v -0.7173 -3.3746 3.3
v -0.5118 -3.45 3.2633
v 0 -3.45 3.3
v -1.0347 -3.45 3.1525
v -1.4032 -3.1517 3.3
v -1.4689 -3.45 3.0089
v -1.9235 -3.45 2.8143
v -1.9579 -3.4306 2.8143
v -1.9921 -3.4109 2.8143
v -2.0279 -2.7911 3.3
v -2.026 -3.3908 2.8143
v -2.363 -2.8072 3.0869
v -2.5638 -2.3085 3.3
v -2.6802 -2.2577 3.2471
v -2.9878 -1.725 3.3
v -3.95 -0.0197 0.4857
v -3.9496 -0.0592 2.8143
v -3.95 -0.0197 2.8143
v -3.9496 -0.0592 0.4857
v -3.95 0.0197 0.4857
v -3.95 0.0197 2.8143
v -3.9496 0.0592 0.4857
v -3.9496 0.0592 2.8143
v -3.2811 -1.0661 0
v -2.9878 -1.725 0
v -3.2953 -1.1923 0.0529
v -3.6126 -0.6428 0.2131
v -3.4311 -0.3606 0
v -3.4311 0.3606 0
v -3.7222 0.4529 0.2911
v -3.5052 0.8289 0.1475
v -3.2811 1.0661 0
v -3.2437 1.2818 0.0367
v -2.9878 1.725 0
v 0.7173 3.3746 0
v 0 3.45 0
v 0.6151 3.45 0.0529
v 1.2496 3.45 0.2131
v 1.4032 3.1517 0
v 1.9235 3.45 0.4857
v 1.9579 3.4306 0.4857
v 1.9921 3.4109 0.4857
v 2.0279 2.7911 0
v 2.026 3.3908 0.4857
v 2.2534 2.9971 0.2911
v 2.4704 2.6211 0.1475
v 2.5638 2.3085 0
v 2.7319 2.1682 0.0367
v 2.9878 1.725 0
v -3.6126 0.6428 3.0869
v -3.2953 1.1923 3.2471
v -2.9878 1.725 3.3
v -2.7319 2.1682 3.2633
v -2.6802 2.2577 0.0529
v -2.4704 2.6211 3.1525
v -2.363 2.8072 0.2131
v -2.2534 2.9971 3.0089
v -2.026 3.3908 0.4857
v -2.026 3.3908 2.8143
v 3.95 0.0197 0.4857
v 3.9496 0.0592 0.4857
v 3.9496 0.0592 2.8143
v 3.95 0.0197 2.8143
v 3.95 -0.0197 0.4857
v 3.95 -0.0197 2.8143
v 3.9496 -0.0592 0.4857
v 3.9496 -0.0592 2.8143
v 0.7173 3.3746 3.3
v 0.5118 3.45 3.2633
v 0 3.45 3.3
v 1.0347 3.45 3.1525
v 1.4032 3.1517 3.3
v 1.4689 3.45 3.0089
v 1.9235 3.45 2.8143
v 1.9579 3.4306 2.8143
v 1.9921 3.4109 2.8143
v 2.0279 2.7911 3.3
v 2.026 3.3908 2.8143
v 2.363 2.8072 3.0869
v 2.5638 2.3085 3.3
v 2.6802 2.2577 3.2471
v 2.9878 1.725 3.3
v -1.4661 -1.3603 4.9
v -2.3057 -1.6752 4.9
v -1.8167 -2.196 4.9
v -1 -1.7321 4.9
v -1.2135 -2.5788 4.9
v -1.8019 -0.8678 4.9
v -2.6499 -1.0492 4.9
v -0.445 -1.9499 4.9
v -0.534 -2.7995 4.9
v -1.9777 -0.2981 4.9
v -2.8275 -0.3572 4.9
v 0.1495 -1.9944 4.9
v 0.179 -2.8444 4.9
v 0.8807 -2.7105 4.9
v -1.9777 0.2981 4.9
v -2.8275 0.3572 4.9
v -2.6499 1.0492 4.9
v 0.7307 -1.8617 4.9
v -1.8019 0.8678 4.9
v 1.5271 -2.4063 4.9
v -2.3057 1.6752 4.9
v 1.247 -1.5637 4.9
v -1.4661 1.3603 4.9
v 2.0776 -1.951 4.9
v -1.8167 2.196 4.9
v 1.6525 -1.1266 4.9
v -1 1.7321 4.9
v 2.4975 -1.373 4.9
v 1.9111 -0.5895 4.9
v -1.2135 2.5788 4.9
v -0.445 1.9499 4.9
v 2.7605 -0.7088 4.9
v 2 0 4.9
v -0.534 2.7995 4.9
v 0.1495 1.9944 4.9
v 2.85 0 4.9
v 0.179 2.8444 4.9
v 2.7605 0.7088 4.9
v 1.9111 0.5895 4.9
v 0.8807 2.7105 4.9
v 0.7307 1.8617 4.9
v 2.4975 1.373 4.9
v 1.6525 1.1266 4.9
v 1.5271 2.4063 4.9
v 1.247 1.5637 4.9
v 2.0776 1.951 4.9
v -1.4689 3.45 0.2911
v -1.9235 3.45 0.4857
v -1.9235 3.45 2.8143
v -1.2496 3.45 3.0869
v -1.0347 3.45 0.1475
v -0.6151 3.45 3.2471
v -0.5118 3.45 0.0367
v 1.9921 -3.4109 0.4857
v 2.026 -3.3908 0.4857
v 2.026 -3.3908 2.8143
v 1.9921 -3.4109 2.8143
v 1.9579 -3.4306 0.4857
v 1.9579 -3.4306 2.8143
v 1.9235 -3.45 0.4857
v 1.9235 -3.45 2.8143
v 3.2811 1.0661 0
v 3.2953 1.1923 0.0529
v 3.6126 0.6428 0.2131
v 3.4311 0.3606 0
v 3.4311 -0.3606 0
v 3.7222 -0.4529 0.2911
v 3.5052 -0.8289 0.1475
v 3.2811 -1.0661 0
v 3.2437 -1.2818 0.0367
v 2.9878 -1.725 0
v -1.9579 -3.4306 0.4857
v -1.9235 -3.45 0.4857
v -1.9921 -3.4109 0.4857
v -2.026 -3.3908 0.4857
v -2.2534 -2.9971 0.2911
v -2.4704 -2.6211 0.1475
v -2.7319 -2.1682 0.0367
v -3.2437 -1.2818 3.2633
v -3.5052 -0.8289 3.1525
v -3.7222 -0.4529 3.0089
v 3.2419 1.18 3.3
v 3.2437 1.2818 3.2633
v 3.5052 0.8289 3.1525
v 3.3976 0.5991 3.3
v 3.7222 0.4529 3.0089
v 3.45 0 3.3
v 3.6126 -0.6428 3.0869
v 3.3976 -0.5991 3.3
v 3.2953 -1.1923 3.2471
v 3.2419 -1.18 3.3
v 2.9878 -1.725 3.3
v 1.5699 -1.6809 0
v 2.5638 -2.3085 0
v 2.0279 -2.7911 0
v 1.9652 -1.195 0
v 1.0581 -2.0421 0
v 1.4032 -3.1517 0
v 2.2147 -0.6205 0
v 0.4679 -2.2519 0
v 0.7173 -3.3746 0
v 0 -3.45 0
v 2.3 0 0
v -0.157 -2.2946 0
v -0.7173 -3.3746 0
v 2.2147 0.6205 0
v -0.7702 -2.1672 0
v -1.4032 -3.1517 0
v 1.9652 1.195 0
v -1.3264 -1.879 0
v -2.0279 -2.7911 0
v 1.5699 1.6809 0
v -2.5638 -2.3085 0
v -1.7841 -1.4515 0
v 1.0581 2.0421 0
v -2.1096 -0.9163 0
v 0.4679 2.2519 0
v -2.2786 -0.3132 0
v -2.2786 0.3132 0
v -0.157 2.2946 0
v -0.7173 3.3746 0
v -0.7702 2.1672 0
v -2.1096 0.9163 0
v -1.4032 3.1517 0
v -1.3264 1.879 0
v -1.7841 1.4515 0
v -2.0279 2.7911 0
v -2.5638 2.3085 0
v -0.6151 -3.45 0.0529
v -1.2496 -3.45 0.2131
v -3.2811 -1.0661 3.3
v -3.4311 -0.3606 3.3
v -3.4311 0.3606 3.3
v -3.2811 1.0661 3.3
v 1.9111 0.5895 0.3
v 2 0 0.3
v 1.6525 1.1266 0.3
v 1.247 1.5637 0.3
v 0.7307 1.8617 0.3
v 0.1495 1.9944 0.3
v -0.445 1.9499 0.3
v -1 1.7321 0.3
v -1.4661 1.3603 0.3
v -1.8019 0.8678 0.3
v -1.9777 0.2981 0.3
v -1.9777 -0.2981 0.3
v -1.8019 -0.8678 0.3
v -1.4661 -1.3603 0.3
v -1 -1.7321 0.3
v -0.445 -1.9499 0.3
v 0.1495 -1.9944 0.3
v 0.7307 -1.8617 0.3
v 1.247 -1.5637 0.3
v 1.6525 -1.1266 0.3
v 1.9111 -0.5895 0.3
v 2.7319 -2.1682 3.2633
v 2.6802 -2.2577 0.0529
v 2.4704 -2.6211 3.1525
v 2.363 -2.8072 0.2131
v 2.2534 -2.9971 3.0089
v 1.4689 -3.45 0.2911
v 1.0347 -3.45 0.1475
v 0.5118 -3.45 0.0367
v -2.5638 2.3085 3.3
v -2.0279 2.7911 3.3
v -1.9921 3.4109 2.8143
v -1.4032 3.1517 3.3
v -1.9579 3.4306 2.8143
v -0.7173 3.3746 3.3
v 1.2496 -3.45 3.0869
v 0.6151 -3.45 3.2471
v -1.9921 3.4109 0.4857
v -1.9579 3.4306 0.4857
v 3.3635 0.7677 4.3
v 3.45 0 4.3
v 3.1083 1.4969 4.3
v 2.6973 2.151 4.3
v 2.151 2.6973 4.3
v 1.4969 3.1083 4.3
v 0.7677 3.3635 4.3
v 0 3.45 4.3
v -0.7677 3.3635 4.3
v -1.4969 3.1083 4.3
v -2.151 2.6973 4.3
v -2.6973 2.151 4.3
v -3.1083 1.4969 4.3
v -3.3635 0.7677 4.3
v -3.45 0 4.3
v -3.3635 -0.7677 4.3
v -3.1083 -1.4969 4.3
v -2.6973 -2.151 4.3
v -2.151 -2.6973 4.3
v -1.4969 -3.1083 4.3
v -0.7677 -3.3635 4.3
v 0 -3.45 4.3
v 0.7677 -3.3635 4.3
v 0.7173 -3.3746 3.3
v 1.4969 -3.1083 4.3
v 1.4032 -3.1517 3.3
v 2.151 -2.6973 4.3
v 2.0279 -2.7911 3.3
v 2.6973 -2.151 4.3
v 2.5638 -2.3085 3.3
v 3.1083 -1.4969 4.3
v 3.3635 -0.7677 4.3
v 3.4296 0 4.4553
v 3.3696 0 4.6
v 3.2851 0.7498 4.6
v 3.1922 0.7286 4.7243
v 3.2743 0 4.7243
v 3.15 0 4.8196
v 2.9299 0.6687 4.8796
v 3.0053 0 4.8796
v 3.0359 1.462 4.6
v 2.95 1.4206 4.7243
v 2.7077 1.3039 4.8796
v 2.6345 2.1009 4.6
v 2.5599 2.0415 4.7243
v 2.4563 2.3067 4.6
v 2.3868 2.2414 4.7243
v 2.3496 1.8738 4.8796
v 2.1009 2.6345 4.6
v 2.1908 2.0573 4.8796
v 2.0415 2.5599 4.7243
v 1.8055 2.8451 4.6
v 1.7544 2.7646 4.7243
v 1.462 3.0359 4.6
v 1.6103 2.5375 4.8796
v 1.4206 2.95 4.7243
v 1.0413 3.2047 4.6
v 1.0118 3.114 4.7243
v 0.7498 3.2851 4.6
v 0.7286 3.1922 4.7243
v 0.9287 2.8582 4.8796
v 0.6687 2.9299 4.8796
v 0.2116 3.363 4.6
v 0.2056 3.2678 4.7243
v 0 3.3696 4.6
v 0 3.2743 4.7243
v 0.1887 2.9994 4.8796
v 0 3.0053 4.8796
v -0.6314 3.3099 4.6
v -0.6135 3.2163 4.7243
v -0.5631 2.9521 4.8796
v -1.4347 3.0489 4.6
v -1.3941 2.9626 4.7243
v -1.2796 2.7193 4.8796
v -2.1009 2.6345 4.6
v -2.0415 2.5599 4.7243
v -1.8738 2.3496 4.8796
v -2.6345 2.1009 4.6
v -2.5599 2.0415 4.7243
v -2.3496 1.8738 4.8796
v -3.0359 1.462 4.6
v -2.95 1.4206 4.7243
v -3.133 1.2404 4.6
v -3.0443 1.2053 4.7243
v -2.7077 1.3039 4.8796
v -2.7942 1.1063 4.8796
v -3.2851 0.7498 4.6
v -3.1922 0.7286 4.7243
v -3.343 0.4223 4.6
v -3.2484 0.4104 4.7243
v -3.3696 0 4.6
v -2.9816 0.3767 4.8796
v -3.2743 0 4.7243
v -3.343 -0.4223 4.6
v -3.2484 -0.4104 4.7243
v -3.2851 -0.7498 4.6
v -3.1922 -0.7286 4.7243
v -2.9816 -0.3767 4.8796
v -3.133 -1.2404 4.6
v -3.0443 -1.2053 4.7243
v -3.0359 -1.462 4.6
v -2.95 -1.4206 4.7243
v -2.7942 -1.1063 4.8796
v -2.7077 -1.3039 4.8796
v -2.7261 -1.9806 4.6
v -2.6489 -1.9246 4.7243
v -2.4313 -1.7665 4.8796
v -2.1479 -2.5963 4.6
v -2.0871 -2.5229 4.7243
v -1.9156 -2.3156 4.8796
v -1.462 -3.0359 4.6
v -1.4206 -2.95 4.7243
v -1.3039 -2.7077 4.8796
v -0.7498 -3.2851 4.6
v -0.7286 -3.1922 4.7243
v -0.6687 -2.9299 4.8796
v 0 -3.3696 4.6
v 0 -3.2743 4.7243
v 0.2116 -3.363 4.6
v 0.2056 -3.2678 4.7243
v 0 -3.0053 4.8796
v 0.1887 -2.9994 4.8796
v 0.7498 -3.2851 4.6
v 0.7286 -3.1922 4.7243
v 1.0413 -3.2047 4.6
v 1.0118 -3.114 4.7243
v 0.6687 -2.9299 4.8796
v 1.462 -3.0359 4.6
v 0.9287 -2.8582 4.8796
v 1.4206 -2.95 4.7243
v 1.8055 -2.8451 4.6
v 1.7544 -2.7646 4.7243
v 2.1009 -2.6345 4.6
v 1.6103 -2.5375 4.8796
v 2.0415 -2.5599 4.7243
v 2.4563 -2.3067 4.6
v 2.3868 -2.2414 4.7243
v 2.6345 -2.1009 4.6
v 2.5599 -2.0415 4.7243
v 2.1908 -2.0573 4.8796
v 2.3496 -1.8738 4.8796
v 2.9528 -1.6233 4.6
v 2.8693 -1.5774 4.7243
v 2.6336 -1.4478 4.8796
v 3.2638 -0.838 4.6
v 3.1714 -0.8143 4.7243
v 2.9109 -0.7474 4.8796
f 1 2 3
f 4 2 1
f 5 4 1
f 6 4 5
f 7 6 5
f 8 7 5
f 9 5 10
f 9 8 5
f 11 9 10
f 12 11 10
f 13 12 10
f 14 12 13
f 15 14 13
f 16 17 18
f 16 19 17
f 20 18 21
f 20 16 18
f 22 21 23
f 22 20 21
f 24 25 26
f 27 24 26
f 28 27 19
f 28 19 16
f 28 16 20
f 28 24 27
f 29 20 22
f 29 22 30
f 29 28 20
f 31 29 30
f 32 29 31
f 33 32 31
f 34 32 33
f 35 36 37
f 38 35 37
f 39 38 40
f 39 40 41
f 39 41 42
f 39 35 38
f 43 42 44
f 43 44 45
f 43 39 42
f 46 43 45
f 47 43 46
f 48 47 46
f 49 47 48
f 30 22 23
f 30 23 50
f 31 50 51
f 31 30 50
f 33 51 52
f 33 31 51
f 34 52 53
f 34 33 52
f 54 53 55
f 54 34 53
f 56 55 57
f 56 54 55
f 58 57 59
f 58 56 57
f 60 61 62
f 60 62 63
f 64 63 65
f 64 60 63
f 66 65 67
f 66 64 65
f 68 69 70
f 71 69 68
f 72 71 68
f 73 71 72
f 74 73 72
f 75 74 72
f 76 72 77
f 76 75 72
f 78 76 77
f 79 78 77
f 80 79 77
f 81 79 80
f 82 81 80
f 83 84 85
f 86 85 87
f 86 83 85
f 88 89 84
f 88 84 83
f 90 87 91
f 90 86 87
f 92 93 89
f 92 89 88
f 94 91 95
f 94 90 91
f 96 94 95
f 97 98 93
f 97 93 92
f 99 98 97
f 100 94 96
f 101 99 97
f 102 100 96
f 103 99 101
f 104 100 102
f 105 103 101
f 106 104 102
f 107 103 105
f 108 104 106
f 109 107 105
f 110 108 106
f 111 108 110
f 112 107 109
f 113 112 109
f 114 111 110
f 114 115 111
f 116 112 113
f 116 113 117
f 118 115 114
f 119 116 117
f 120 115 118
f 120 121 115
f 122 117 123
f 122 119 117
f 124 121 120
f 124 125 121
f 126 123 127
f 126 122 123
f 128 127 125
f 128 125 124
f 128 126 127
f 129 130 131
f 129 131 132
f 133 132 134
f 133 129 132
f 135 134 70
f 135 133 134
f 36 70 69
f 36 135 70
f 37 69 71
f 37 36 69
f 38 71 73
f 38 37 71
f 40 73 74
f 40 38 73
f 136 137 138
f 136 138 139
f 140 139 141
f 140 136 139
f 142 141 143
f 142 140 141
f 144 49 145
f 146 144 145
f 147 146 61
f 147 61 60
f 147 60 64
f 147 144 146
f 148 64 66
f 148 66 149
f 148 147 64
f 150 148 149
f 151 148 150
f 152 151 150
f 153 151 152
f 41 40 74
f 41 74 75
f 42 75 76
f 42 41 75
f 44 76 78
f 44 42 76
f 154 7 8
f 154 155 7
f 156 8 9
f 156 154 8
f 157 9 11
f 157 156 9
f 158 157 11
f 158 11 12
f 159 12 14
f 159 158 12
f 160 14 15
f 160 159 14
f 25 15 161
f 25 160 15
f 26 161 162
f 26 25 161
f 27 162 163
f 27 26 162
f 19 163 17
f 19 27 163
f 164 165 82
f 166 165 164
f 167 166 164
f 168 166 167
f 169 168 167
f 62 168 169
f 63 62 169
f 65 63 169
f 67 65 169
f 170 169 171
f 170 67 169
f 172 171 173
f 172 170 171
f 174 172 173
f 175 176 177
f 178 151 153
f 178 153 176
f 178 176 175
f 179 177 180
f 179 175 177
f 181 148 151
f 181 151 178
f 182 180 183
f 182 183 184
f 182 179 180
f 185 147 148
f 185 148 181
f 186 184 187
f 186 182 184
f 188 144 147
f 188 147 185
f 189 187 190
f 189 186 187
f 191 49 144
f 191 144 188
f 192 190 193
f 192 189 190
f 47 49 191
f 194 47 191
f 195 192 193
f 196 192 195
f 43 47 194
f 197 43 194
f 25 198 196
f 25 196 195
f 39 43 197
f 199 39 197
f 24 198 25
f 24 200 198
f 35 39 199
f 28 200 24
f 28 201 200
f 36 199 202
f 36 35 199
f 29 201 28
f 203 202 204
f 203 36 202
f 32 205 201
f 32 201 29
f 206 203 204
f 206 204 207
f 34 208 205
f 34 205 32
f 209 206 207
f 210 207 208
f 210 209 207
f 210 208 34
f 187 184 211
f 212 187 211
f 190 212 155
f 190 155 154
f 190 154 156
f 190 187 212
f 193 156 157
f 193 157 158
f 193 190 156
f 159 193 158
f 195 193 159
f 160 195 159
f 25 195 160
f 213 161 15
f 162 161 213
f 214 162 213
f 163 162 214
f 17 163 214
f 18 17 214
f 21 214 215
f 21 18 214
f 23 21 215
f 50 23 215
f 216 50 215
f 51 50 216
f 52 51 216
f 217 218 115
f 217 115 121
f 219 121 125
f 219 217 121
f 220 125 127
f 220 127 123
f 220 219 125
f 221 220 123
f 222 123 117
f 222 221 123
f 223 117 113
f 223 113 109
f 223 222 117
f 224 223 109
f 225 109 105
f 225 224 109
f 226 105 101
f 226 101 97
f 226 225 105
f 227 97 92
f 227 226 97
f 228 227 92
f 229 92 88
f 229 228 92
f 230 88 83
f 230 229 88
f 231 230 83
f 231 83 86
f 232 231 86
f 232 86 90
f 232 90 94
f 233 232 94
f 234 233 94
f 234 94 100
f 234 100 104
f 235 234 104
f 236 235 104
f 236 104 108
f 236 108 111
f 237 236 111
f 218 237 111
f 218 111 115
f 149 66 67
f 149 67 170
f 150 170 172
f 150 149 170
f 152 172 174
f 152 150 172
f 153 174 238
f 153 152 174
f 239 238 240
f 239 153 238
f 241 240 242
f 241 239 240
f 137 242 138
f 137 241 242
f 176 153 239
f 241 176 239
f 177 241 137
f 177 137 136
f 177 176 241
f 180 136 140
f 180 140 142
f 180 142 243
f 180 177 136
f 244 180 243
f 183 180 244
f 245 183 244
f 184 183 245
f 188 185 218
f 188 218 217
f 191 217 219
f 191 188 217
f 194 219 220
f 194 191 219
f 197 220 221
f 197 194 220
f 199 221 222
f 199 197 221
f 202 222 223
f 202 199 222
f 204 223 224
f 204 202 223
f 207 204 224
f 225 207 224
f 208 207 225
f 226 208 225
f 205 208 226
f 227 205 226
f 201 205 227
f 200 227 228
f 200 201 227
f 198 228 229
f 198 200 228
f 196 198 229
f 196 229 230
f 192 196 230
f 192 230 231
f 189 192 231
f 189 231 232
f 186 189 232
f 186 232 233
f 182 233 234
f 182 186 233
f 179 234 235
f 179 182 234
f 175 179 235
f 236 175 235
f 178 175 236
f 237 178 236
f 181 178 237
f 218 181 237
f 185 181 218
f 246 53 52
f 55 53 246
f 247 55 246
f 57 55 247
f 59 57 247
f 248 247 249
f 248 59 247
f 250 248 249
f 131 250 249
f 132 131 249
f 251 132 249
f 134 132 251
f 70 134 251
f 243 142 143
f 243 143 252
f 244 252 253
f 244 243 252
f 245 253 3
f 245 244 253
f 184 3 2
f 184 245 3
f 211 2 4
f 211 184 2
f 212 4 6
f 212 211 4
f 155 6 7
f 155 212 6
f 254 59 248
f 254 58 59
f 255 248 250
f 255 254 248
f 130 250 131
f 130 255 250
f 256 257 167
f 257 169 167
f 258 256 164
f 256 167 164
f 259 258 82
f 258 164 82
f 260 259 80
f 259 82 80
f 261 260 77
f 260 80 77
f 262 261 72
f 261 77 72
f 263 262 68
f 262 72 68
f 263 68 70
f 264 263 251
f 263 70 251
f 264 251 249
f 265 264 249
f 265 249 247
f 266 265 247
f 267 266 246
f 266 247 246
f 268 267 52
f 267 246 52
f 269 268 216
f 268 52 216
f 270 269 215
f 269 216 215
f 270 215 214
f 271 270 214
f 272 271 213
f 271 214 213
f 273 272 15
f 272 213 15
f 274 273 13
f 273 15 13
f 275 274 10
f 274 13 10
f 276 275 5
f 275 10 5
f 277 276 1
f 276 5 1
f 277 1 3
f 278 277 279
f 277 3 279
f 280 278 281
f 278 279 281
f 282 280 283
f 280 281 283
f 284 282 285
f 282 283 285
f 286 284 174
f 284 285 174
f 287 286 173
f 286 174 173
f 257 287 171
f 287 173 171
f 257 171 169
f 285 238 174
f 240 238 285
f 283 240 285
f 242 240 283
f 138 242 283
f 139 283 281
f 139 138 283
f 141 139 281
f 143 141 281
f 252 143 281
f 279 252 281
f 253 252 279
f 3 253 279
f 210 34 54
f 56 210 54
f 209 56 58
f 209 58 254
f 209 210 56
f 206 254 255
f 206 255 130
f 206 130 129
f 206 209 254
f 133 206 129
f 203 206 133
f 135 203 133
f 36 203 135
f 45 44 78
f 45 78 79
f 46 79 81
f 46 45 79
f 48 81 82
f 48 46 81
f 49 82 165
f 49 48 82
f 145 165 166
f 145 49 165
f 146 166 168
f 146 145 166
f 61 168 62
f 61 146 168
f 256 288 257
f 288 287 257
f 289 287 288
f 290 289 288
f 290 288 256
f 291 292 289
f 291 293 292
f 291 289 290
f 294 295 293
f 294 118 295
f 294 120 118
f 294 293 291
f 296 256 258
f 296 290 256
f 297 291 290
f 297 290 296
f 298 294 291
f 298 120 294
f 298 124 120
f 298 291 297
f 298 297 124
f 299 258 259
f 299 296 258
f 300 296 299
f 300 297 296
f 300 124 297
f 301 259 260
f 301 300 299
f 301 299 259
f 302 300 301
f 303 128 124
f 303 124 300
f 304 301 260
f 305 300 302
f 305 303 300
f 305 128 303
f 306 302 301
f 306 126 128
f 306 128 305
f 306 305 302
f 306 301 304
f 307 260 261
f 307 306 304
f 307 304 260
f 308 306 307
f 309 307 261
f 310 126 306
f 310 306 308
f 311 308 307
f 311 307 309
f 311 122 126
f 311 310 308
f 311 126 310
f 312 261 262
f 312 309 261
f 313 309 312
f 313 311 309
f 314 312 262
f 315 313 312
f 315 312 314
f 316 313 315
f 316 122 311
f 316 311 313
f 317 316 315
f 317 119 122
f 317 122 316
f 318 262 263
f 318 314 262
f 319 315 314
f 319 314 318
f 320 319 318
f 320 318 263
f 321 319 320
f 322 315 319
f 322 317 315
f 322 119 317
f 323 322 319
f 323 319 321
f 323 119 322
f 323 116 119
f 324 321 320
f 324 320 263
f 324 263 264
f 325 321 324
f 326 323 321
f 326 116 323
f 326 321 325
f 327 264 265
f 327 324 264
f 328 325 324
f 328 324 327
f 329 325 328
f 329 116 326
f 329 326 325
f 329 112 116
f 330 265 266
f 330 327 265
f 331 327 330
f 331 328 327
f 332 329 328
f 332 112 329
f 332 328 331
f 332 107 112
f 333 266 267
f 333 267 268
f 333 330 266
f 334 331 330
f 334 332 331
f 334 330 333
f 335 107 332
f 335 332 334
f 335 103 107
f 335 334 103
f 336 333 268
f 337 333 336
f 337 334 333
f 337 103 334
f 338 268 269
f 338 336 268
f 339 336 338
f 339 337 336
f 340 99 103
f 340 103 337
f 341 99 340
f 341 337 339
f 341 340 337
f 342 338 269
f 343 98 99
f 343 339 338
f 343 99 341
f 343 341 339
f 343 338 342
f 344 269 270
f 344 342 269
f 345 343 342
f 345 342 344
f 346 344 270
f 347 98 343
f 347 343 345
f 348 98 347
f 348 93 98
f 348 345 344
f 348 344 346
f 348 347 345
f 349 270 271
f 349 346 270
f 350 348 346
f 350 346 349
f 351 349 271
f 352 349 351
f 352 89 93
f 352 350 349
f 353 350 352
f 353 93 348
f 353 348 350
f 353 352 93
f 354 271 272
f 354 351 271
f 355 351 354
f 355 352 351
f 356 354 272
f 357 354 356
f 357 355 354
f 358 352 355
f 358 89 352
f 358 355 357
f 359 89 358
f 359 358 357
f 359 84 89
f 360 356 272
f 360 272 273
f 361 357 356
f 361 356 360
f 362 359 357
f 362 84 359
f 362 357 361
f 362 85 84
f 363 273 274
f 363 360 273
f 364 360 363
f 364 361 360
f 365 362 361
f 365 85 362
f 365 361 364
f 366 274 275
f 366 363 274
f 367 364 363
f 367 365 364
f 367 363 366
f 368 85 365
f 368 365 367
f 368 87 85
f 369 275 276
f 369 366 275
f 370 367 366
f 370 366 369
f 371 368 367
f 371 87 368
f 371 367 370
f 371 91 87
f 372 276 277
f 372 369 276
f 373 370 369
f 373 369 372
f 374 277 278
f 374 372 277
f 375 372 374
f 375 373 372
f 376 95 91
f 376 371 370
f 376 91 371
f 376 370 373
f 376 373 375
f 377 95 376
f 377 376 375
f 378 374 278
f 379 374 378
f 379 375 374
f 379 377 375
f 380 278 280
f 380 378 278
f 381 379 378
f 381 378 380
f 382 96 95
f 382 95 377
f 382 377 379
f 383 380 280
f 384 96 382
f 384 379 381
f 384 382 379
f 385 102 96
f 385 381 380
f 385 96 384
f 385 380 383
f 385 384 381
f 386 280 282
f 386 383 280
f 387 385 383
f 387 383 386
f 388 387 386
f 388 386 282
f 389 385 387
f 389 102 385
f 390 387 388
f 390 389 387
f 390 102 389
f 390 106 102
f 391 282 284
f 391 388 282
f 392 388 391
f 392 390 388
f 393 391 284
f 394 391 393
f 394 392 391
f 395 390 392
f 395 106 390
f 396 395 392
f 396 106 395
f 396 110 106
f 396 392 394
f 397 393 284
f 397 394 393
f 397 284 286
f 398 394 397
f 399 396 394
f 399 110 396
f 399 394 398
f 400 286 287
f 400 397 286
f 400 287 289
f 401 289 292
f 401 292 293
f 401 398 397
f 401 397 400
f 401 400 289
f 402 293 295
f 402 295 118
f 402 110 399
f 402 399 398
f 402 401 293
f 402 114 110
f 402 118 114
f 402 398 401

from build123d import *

# Parameters (mm, degrees)
SKETCH1_R           = 2
BOSS_EXTRUDE1_DEPTH = 3.3
SKETCH2_R           = 3.45
SKETCH2_R_2         = 2
BOSS_EXTRUDE2_DEPTH = 1.6
FILLET1_R           = 0.6
CHAMFER1_SIZE       = 0.3


with BuildPart() as part:
    # Sketch1 → Boss-Extrude1 (new body)
    with BuildSketch(Plane.XY):
        Polygon((-1.991858429, 3.45), (1.991858429, 3.45), (3.983716857, 0), (1.991858429, -3.45), (-1.991858429, -3.45), (-3.983716857, 0), align=None)
        Circle(SKETCH1_R, mode=Mode.SUBTRACT)
    extrude(amount=BOSS_EXTRUDE1_DEPTH)

    # Sketch2 → Boss-Extrude2 (add)
    with BuildSketch(Plane.XY.offset(3.3)):
        Circle(SKETCH2_R)
        Circle(SKETCH2_R_2, mode=Mode.SUBTRACT)
    extrude(amount=BOSS_EXTRUDE2_DEPTH)

    # Fillet1
    fillet1_edges = [part.edges().sort_by_distance(p)[0] for p in [
        (-3.45, 0, 4.9),
    ]]
    fillet(fillet1_edges, radius=FILLET1_R)

    # Sketch3 → Cut-Revolve1 (revolve, cut)
    with BuildSketch(Plane(origin=(0, 0, 0), x_dir=(0, 0, -1), z_dir=(1, 0, 0))):
        Polygon((-3.3, 3.45), (-2.814276913, 3.95), (-0.485723087, 3.95), (0, 3.45), (0, 4.719262328), (-3.3, 4.719262328), align=None)
    revolve(axis=Axis((0, 0, 0), (0, 0, -1)), mode=Mode.SUBTRACT)

    # Chamfer1
    chamfer1_edges = [part.edges().sort_by_distance(p)[0] for p in [
        (-2, 0, 0),
    ]]
    chamfer(chamfer1_edges, length=CHAMFER1_SIZE)


solid = part.part
